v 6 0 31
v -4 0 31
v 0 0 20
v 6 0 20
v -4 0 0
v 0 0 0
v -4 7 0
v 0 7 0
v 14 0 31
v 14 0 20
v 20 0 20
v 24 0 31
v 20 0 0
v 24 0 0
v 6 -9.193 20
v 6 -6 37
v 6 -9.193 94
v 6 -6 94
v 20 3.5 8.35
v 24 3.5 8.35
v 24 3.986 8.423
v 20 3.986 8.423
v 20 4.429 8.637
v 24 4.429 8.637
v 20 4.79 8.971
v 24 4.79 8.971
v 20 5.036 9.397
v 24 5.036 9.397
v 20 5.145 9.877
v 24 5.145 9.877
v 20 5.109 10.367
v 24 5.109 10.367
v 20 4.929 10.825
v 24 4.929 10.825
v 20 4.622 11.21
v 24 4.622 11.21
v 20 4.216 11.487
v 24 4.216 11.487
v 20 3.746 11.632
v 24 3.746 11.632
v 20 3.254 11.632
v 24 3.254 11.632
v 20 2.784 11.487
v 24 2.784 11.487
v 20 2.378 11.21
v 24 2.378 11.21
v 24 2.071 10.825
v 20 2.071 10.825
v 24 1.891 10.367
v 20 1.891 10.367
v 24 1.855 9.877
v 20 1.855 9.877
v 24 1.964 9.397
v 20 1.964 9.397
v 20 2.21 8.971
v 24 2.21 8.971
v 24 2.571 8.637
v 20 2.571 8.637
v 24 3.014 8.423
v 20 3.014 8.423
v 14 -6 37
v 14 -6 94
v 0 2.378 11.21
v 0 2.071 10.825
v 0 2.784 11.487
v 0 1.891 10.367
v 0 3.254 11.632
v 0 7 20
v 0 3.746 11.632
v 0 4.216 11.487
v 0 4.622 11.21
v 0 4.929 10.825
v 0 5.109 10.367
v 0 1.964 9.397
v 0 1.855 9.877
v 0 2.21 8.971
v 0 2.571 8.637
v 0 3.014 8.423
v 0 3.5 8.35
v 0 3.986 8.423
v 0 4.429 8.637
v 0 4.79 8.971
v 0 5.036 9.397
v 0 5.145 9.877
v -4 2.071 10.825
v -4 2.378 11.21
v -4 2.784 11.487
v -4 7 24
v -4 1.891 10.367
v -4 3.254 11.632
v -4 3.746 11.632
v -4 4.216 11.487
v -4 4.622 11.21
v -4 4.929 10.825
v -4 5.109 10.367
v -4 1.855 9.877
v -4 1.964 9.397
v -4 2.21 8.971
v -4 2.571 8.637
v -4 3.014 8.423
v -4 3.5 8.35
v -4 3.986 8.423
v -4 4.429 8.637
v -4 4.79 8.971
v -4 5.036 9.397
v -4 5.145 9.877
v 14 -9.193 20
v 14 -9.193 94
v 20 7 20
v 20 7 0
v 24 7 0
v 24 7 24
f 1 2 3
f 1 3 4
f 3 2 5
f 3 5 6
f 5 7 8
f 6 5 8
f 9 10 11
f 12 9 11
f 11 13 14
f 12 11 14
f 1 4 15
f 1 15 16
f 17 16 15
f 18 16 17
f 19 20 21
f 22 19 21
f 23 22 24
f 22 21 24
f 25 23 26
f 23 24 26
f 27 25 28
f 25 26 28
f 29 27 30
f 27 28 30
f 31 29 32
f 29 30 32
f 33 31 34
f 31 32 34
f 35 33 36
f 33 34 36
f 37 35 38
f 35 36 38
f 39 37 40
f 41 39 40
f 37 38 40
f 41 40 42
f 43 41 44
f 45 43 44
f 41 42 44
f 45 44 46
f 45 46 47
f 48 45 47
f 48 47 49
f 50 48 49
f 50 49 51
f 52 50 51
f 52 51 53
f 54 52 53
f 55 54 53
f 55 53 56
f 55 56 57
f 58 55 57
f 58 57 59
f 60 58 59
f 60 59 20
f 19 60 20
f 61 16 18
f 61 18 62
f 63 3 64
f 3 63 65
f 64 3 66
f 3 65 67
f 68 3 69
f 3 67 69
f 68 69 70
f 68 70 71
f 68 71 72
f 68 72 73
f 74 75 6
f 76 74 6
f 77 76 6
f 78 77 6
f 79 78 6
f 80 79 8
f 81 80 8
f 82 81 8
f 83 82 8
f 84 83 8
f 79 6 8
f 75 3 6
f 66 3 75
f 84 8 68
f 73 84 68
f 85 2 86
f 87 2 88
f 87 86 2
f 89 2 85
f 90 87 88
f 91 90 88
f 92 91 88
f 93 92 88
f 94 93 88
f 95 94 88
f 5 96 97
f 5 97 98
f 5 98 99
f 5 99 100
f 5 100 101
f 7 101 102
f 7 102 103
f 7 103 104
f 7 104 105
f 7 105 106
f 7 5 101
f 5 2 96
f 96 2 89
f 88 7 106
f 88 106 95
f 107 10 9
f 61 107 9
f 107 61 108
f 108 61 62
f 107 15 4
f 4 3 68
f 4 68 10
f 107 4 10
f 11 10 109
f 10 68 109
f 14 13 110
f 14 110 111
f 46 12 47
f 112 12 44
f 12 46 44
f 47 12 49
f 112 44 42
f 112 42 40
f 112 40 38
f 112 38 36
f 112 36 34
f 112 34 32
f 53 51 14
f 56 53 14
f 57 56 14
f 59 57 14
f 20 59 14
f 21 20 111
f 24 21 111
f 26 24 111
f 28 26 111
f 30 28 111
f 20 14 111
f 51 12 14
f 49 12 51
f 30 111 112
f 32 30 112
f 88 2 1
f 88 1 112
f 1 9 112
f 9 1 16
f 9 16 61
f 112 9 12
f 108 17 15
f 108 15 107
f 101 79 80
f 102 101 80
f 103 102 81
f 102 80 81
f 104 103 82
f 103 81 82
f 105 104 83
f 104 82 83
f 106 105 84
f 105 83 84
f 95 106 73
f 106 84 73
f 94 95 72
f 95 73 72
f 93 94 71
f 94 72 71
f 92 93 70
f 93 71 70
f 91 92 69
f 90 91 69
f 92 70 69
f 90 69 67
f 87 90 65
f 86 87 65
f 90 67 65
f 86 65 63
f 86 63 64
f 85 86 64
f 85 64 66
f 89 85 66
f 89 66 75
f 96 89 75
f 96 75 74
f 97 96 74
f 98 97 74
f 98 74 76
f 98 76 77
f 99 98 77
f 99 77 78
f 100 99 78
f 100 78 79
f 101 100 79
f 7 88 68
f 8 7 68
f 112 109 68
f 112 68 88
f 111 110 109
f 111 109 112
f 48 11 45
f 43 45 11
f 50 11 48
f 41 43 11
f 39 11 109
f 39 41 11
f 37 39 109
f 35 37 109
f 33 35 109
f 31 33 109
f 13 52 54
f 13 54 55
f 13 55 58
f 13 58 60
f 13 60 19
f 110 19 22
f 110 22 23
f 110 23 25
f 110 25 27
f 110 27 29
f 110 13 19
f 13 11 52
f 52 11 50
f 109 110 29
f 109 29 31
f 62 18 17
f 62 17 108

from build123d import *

# Parameters (mm, degrees)
SKETCH1_W             = 4
SKETCH1_H             = 7
BOSS_EXTRUDE1_DEPTH   = 24
BOSS_EXTRUDE1_2_DEPTH = 24
BOSS_EXTRUDE2_START   = 20
SKETCH1_3_W           = 20
SKETCH1_3_H           = 7
BOSS_EXTRUDE2_DEPTH   = 4
SKETCH2_W             = 8
SKETCH2_H             = 2.193366053
BOSS_EXTRUDE3_DEPTH   = 70
SKETCH3_W             = 8
SKETCH3_H             = 8.193366053
BOSS_EXTRUDE4_DEPTH   = 4
CUT_EXTRUDE1_REACH    = 100.423
SKETCH4_R             = 1.65
CHAMFER1_SIZE         = 13
SKETCH5_W             = 8
SKETCH5_H             = 74
BOSS_EXTRUDE5_DEPTH   = 1


with BuildPart() as part:
    # Sketch1 → Boss-Extrude1 (new body)
    with BuildSketch(Plane.XY):
        with Locations((-2, 3.5)):
            Rectangle(SKETCH1_W, SKETCH1_H)
    extrude(amount=BOSS_EXTRUDE1_DEPTH)



with BuildPart() as body_2:
    # Sketch1 → Boss-Extrude1 2 (new body)
    with BuildSketch(Plane.XY):
        with Locations((22, 3.5)):
            Rectangle(SKETCH1_W, SKETCH1_H)
    extrude(amount=BOSS_EXTRUDE1_2_DEPTH)


with BuildPart() as part_1:
    add(part.part)

    add(body_2.part)  # Boss-Extrude2 merges body 2
    # Sketch1<3> → Boss-Extrude2 (add)
    with BuildSketch(Plane.XY.offset(BOSS_EXTRUDE2_START)):
        with Locations((10, 3.5)):
            Rectangle(SKETCH1_3_W, SKETCH1_3_H)
    extrude(amount=BOSS_EXTRUDE2_DEPTH)



with BuildPart() as body_2_2:
    # Sketch2 → Boss-Extrude3 (new body)
    with BuildSketch(Plane.XY.offset(24)):
        with Locations((10, -7.096683027)):
            Rectangle(SKETCH2_W, SKETCH2_H)
    extrude(amount=BOSS_EXTRUDE3_DEPTH)


with BuildPart() as part_2:
    add(part_1.part)

    add(body_2_2.part)  # Boss-Extrude4 merges body 2 2
    # Sketch3 → Boss-Extrude4 (add)
    with BuildSketch(Plane(origin=(0, 0, 24), x_dir=(-1, 0, 0), z_dir=(0, 0, -1))):
        with Locations((-10, -4.096683027)):
            Rectangle(SKETCH3_W, SKETCH3_H)
    extrude(amount=BOSS_EXTRUDE4_DEPTH)

    # Cut-Extrude1: up to this face of the body (flat: up to its plane)
    cut_extrude1_end = Plane(part_2.part.faces().sort_by_distance((-4, 3.5, 12))[0])
    # Sketch4 → Cut-Extrude1 (cut, up to the picked face)
    with BuildSketch(Plane(origin=(24, 0, 0), x_dir=(0, 0, -1), z_dir=(1, 0, 0)), mode=Mode.PRIVATE) as cut_extrude1_sk1:
        with Locations((-10, 3.5)):
            Circle(SKETCH4_R)
    cut_extrude1_tool1 = split(extrude(cut_extrude1_sk1.sketch, amount=-CUT_EXTRUDE1_REACH, mode=Mode.PRIVATE), bisect_by=cut_extrude1_end, keep=Keep.BOTH, mode=Mode.PRIVATE)
    add(cut_extrude1_tool1.solids().sort_by(Axis((24, 3.5, 10), (-1, 0, 0)))[0], mode=Mode.SUBTRACT)

    # Chamfer1
    chamfer1_edges = [part_2.edges().sort_by_distance(p)[0] for p in [
        (10, -6, 24),
    ]]
    chamfer(chamfer1_edges, length=CHAMFER1_SIZE - 0.0001)  # a hair under: the kernel refuses the full size

    # Sketch5 → Boss-Extrude5 (add)
    with BuildSketch(Plane.XZ.offset(8.193366053)):
        with Locations((10, 57)):
            Rectangle(SKETCH5_W, SKETCH5_H)
    extrude(amount=BOSS_EXTRUDE5_DEPTH)


solid = part_2.part
